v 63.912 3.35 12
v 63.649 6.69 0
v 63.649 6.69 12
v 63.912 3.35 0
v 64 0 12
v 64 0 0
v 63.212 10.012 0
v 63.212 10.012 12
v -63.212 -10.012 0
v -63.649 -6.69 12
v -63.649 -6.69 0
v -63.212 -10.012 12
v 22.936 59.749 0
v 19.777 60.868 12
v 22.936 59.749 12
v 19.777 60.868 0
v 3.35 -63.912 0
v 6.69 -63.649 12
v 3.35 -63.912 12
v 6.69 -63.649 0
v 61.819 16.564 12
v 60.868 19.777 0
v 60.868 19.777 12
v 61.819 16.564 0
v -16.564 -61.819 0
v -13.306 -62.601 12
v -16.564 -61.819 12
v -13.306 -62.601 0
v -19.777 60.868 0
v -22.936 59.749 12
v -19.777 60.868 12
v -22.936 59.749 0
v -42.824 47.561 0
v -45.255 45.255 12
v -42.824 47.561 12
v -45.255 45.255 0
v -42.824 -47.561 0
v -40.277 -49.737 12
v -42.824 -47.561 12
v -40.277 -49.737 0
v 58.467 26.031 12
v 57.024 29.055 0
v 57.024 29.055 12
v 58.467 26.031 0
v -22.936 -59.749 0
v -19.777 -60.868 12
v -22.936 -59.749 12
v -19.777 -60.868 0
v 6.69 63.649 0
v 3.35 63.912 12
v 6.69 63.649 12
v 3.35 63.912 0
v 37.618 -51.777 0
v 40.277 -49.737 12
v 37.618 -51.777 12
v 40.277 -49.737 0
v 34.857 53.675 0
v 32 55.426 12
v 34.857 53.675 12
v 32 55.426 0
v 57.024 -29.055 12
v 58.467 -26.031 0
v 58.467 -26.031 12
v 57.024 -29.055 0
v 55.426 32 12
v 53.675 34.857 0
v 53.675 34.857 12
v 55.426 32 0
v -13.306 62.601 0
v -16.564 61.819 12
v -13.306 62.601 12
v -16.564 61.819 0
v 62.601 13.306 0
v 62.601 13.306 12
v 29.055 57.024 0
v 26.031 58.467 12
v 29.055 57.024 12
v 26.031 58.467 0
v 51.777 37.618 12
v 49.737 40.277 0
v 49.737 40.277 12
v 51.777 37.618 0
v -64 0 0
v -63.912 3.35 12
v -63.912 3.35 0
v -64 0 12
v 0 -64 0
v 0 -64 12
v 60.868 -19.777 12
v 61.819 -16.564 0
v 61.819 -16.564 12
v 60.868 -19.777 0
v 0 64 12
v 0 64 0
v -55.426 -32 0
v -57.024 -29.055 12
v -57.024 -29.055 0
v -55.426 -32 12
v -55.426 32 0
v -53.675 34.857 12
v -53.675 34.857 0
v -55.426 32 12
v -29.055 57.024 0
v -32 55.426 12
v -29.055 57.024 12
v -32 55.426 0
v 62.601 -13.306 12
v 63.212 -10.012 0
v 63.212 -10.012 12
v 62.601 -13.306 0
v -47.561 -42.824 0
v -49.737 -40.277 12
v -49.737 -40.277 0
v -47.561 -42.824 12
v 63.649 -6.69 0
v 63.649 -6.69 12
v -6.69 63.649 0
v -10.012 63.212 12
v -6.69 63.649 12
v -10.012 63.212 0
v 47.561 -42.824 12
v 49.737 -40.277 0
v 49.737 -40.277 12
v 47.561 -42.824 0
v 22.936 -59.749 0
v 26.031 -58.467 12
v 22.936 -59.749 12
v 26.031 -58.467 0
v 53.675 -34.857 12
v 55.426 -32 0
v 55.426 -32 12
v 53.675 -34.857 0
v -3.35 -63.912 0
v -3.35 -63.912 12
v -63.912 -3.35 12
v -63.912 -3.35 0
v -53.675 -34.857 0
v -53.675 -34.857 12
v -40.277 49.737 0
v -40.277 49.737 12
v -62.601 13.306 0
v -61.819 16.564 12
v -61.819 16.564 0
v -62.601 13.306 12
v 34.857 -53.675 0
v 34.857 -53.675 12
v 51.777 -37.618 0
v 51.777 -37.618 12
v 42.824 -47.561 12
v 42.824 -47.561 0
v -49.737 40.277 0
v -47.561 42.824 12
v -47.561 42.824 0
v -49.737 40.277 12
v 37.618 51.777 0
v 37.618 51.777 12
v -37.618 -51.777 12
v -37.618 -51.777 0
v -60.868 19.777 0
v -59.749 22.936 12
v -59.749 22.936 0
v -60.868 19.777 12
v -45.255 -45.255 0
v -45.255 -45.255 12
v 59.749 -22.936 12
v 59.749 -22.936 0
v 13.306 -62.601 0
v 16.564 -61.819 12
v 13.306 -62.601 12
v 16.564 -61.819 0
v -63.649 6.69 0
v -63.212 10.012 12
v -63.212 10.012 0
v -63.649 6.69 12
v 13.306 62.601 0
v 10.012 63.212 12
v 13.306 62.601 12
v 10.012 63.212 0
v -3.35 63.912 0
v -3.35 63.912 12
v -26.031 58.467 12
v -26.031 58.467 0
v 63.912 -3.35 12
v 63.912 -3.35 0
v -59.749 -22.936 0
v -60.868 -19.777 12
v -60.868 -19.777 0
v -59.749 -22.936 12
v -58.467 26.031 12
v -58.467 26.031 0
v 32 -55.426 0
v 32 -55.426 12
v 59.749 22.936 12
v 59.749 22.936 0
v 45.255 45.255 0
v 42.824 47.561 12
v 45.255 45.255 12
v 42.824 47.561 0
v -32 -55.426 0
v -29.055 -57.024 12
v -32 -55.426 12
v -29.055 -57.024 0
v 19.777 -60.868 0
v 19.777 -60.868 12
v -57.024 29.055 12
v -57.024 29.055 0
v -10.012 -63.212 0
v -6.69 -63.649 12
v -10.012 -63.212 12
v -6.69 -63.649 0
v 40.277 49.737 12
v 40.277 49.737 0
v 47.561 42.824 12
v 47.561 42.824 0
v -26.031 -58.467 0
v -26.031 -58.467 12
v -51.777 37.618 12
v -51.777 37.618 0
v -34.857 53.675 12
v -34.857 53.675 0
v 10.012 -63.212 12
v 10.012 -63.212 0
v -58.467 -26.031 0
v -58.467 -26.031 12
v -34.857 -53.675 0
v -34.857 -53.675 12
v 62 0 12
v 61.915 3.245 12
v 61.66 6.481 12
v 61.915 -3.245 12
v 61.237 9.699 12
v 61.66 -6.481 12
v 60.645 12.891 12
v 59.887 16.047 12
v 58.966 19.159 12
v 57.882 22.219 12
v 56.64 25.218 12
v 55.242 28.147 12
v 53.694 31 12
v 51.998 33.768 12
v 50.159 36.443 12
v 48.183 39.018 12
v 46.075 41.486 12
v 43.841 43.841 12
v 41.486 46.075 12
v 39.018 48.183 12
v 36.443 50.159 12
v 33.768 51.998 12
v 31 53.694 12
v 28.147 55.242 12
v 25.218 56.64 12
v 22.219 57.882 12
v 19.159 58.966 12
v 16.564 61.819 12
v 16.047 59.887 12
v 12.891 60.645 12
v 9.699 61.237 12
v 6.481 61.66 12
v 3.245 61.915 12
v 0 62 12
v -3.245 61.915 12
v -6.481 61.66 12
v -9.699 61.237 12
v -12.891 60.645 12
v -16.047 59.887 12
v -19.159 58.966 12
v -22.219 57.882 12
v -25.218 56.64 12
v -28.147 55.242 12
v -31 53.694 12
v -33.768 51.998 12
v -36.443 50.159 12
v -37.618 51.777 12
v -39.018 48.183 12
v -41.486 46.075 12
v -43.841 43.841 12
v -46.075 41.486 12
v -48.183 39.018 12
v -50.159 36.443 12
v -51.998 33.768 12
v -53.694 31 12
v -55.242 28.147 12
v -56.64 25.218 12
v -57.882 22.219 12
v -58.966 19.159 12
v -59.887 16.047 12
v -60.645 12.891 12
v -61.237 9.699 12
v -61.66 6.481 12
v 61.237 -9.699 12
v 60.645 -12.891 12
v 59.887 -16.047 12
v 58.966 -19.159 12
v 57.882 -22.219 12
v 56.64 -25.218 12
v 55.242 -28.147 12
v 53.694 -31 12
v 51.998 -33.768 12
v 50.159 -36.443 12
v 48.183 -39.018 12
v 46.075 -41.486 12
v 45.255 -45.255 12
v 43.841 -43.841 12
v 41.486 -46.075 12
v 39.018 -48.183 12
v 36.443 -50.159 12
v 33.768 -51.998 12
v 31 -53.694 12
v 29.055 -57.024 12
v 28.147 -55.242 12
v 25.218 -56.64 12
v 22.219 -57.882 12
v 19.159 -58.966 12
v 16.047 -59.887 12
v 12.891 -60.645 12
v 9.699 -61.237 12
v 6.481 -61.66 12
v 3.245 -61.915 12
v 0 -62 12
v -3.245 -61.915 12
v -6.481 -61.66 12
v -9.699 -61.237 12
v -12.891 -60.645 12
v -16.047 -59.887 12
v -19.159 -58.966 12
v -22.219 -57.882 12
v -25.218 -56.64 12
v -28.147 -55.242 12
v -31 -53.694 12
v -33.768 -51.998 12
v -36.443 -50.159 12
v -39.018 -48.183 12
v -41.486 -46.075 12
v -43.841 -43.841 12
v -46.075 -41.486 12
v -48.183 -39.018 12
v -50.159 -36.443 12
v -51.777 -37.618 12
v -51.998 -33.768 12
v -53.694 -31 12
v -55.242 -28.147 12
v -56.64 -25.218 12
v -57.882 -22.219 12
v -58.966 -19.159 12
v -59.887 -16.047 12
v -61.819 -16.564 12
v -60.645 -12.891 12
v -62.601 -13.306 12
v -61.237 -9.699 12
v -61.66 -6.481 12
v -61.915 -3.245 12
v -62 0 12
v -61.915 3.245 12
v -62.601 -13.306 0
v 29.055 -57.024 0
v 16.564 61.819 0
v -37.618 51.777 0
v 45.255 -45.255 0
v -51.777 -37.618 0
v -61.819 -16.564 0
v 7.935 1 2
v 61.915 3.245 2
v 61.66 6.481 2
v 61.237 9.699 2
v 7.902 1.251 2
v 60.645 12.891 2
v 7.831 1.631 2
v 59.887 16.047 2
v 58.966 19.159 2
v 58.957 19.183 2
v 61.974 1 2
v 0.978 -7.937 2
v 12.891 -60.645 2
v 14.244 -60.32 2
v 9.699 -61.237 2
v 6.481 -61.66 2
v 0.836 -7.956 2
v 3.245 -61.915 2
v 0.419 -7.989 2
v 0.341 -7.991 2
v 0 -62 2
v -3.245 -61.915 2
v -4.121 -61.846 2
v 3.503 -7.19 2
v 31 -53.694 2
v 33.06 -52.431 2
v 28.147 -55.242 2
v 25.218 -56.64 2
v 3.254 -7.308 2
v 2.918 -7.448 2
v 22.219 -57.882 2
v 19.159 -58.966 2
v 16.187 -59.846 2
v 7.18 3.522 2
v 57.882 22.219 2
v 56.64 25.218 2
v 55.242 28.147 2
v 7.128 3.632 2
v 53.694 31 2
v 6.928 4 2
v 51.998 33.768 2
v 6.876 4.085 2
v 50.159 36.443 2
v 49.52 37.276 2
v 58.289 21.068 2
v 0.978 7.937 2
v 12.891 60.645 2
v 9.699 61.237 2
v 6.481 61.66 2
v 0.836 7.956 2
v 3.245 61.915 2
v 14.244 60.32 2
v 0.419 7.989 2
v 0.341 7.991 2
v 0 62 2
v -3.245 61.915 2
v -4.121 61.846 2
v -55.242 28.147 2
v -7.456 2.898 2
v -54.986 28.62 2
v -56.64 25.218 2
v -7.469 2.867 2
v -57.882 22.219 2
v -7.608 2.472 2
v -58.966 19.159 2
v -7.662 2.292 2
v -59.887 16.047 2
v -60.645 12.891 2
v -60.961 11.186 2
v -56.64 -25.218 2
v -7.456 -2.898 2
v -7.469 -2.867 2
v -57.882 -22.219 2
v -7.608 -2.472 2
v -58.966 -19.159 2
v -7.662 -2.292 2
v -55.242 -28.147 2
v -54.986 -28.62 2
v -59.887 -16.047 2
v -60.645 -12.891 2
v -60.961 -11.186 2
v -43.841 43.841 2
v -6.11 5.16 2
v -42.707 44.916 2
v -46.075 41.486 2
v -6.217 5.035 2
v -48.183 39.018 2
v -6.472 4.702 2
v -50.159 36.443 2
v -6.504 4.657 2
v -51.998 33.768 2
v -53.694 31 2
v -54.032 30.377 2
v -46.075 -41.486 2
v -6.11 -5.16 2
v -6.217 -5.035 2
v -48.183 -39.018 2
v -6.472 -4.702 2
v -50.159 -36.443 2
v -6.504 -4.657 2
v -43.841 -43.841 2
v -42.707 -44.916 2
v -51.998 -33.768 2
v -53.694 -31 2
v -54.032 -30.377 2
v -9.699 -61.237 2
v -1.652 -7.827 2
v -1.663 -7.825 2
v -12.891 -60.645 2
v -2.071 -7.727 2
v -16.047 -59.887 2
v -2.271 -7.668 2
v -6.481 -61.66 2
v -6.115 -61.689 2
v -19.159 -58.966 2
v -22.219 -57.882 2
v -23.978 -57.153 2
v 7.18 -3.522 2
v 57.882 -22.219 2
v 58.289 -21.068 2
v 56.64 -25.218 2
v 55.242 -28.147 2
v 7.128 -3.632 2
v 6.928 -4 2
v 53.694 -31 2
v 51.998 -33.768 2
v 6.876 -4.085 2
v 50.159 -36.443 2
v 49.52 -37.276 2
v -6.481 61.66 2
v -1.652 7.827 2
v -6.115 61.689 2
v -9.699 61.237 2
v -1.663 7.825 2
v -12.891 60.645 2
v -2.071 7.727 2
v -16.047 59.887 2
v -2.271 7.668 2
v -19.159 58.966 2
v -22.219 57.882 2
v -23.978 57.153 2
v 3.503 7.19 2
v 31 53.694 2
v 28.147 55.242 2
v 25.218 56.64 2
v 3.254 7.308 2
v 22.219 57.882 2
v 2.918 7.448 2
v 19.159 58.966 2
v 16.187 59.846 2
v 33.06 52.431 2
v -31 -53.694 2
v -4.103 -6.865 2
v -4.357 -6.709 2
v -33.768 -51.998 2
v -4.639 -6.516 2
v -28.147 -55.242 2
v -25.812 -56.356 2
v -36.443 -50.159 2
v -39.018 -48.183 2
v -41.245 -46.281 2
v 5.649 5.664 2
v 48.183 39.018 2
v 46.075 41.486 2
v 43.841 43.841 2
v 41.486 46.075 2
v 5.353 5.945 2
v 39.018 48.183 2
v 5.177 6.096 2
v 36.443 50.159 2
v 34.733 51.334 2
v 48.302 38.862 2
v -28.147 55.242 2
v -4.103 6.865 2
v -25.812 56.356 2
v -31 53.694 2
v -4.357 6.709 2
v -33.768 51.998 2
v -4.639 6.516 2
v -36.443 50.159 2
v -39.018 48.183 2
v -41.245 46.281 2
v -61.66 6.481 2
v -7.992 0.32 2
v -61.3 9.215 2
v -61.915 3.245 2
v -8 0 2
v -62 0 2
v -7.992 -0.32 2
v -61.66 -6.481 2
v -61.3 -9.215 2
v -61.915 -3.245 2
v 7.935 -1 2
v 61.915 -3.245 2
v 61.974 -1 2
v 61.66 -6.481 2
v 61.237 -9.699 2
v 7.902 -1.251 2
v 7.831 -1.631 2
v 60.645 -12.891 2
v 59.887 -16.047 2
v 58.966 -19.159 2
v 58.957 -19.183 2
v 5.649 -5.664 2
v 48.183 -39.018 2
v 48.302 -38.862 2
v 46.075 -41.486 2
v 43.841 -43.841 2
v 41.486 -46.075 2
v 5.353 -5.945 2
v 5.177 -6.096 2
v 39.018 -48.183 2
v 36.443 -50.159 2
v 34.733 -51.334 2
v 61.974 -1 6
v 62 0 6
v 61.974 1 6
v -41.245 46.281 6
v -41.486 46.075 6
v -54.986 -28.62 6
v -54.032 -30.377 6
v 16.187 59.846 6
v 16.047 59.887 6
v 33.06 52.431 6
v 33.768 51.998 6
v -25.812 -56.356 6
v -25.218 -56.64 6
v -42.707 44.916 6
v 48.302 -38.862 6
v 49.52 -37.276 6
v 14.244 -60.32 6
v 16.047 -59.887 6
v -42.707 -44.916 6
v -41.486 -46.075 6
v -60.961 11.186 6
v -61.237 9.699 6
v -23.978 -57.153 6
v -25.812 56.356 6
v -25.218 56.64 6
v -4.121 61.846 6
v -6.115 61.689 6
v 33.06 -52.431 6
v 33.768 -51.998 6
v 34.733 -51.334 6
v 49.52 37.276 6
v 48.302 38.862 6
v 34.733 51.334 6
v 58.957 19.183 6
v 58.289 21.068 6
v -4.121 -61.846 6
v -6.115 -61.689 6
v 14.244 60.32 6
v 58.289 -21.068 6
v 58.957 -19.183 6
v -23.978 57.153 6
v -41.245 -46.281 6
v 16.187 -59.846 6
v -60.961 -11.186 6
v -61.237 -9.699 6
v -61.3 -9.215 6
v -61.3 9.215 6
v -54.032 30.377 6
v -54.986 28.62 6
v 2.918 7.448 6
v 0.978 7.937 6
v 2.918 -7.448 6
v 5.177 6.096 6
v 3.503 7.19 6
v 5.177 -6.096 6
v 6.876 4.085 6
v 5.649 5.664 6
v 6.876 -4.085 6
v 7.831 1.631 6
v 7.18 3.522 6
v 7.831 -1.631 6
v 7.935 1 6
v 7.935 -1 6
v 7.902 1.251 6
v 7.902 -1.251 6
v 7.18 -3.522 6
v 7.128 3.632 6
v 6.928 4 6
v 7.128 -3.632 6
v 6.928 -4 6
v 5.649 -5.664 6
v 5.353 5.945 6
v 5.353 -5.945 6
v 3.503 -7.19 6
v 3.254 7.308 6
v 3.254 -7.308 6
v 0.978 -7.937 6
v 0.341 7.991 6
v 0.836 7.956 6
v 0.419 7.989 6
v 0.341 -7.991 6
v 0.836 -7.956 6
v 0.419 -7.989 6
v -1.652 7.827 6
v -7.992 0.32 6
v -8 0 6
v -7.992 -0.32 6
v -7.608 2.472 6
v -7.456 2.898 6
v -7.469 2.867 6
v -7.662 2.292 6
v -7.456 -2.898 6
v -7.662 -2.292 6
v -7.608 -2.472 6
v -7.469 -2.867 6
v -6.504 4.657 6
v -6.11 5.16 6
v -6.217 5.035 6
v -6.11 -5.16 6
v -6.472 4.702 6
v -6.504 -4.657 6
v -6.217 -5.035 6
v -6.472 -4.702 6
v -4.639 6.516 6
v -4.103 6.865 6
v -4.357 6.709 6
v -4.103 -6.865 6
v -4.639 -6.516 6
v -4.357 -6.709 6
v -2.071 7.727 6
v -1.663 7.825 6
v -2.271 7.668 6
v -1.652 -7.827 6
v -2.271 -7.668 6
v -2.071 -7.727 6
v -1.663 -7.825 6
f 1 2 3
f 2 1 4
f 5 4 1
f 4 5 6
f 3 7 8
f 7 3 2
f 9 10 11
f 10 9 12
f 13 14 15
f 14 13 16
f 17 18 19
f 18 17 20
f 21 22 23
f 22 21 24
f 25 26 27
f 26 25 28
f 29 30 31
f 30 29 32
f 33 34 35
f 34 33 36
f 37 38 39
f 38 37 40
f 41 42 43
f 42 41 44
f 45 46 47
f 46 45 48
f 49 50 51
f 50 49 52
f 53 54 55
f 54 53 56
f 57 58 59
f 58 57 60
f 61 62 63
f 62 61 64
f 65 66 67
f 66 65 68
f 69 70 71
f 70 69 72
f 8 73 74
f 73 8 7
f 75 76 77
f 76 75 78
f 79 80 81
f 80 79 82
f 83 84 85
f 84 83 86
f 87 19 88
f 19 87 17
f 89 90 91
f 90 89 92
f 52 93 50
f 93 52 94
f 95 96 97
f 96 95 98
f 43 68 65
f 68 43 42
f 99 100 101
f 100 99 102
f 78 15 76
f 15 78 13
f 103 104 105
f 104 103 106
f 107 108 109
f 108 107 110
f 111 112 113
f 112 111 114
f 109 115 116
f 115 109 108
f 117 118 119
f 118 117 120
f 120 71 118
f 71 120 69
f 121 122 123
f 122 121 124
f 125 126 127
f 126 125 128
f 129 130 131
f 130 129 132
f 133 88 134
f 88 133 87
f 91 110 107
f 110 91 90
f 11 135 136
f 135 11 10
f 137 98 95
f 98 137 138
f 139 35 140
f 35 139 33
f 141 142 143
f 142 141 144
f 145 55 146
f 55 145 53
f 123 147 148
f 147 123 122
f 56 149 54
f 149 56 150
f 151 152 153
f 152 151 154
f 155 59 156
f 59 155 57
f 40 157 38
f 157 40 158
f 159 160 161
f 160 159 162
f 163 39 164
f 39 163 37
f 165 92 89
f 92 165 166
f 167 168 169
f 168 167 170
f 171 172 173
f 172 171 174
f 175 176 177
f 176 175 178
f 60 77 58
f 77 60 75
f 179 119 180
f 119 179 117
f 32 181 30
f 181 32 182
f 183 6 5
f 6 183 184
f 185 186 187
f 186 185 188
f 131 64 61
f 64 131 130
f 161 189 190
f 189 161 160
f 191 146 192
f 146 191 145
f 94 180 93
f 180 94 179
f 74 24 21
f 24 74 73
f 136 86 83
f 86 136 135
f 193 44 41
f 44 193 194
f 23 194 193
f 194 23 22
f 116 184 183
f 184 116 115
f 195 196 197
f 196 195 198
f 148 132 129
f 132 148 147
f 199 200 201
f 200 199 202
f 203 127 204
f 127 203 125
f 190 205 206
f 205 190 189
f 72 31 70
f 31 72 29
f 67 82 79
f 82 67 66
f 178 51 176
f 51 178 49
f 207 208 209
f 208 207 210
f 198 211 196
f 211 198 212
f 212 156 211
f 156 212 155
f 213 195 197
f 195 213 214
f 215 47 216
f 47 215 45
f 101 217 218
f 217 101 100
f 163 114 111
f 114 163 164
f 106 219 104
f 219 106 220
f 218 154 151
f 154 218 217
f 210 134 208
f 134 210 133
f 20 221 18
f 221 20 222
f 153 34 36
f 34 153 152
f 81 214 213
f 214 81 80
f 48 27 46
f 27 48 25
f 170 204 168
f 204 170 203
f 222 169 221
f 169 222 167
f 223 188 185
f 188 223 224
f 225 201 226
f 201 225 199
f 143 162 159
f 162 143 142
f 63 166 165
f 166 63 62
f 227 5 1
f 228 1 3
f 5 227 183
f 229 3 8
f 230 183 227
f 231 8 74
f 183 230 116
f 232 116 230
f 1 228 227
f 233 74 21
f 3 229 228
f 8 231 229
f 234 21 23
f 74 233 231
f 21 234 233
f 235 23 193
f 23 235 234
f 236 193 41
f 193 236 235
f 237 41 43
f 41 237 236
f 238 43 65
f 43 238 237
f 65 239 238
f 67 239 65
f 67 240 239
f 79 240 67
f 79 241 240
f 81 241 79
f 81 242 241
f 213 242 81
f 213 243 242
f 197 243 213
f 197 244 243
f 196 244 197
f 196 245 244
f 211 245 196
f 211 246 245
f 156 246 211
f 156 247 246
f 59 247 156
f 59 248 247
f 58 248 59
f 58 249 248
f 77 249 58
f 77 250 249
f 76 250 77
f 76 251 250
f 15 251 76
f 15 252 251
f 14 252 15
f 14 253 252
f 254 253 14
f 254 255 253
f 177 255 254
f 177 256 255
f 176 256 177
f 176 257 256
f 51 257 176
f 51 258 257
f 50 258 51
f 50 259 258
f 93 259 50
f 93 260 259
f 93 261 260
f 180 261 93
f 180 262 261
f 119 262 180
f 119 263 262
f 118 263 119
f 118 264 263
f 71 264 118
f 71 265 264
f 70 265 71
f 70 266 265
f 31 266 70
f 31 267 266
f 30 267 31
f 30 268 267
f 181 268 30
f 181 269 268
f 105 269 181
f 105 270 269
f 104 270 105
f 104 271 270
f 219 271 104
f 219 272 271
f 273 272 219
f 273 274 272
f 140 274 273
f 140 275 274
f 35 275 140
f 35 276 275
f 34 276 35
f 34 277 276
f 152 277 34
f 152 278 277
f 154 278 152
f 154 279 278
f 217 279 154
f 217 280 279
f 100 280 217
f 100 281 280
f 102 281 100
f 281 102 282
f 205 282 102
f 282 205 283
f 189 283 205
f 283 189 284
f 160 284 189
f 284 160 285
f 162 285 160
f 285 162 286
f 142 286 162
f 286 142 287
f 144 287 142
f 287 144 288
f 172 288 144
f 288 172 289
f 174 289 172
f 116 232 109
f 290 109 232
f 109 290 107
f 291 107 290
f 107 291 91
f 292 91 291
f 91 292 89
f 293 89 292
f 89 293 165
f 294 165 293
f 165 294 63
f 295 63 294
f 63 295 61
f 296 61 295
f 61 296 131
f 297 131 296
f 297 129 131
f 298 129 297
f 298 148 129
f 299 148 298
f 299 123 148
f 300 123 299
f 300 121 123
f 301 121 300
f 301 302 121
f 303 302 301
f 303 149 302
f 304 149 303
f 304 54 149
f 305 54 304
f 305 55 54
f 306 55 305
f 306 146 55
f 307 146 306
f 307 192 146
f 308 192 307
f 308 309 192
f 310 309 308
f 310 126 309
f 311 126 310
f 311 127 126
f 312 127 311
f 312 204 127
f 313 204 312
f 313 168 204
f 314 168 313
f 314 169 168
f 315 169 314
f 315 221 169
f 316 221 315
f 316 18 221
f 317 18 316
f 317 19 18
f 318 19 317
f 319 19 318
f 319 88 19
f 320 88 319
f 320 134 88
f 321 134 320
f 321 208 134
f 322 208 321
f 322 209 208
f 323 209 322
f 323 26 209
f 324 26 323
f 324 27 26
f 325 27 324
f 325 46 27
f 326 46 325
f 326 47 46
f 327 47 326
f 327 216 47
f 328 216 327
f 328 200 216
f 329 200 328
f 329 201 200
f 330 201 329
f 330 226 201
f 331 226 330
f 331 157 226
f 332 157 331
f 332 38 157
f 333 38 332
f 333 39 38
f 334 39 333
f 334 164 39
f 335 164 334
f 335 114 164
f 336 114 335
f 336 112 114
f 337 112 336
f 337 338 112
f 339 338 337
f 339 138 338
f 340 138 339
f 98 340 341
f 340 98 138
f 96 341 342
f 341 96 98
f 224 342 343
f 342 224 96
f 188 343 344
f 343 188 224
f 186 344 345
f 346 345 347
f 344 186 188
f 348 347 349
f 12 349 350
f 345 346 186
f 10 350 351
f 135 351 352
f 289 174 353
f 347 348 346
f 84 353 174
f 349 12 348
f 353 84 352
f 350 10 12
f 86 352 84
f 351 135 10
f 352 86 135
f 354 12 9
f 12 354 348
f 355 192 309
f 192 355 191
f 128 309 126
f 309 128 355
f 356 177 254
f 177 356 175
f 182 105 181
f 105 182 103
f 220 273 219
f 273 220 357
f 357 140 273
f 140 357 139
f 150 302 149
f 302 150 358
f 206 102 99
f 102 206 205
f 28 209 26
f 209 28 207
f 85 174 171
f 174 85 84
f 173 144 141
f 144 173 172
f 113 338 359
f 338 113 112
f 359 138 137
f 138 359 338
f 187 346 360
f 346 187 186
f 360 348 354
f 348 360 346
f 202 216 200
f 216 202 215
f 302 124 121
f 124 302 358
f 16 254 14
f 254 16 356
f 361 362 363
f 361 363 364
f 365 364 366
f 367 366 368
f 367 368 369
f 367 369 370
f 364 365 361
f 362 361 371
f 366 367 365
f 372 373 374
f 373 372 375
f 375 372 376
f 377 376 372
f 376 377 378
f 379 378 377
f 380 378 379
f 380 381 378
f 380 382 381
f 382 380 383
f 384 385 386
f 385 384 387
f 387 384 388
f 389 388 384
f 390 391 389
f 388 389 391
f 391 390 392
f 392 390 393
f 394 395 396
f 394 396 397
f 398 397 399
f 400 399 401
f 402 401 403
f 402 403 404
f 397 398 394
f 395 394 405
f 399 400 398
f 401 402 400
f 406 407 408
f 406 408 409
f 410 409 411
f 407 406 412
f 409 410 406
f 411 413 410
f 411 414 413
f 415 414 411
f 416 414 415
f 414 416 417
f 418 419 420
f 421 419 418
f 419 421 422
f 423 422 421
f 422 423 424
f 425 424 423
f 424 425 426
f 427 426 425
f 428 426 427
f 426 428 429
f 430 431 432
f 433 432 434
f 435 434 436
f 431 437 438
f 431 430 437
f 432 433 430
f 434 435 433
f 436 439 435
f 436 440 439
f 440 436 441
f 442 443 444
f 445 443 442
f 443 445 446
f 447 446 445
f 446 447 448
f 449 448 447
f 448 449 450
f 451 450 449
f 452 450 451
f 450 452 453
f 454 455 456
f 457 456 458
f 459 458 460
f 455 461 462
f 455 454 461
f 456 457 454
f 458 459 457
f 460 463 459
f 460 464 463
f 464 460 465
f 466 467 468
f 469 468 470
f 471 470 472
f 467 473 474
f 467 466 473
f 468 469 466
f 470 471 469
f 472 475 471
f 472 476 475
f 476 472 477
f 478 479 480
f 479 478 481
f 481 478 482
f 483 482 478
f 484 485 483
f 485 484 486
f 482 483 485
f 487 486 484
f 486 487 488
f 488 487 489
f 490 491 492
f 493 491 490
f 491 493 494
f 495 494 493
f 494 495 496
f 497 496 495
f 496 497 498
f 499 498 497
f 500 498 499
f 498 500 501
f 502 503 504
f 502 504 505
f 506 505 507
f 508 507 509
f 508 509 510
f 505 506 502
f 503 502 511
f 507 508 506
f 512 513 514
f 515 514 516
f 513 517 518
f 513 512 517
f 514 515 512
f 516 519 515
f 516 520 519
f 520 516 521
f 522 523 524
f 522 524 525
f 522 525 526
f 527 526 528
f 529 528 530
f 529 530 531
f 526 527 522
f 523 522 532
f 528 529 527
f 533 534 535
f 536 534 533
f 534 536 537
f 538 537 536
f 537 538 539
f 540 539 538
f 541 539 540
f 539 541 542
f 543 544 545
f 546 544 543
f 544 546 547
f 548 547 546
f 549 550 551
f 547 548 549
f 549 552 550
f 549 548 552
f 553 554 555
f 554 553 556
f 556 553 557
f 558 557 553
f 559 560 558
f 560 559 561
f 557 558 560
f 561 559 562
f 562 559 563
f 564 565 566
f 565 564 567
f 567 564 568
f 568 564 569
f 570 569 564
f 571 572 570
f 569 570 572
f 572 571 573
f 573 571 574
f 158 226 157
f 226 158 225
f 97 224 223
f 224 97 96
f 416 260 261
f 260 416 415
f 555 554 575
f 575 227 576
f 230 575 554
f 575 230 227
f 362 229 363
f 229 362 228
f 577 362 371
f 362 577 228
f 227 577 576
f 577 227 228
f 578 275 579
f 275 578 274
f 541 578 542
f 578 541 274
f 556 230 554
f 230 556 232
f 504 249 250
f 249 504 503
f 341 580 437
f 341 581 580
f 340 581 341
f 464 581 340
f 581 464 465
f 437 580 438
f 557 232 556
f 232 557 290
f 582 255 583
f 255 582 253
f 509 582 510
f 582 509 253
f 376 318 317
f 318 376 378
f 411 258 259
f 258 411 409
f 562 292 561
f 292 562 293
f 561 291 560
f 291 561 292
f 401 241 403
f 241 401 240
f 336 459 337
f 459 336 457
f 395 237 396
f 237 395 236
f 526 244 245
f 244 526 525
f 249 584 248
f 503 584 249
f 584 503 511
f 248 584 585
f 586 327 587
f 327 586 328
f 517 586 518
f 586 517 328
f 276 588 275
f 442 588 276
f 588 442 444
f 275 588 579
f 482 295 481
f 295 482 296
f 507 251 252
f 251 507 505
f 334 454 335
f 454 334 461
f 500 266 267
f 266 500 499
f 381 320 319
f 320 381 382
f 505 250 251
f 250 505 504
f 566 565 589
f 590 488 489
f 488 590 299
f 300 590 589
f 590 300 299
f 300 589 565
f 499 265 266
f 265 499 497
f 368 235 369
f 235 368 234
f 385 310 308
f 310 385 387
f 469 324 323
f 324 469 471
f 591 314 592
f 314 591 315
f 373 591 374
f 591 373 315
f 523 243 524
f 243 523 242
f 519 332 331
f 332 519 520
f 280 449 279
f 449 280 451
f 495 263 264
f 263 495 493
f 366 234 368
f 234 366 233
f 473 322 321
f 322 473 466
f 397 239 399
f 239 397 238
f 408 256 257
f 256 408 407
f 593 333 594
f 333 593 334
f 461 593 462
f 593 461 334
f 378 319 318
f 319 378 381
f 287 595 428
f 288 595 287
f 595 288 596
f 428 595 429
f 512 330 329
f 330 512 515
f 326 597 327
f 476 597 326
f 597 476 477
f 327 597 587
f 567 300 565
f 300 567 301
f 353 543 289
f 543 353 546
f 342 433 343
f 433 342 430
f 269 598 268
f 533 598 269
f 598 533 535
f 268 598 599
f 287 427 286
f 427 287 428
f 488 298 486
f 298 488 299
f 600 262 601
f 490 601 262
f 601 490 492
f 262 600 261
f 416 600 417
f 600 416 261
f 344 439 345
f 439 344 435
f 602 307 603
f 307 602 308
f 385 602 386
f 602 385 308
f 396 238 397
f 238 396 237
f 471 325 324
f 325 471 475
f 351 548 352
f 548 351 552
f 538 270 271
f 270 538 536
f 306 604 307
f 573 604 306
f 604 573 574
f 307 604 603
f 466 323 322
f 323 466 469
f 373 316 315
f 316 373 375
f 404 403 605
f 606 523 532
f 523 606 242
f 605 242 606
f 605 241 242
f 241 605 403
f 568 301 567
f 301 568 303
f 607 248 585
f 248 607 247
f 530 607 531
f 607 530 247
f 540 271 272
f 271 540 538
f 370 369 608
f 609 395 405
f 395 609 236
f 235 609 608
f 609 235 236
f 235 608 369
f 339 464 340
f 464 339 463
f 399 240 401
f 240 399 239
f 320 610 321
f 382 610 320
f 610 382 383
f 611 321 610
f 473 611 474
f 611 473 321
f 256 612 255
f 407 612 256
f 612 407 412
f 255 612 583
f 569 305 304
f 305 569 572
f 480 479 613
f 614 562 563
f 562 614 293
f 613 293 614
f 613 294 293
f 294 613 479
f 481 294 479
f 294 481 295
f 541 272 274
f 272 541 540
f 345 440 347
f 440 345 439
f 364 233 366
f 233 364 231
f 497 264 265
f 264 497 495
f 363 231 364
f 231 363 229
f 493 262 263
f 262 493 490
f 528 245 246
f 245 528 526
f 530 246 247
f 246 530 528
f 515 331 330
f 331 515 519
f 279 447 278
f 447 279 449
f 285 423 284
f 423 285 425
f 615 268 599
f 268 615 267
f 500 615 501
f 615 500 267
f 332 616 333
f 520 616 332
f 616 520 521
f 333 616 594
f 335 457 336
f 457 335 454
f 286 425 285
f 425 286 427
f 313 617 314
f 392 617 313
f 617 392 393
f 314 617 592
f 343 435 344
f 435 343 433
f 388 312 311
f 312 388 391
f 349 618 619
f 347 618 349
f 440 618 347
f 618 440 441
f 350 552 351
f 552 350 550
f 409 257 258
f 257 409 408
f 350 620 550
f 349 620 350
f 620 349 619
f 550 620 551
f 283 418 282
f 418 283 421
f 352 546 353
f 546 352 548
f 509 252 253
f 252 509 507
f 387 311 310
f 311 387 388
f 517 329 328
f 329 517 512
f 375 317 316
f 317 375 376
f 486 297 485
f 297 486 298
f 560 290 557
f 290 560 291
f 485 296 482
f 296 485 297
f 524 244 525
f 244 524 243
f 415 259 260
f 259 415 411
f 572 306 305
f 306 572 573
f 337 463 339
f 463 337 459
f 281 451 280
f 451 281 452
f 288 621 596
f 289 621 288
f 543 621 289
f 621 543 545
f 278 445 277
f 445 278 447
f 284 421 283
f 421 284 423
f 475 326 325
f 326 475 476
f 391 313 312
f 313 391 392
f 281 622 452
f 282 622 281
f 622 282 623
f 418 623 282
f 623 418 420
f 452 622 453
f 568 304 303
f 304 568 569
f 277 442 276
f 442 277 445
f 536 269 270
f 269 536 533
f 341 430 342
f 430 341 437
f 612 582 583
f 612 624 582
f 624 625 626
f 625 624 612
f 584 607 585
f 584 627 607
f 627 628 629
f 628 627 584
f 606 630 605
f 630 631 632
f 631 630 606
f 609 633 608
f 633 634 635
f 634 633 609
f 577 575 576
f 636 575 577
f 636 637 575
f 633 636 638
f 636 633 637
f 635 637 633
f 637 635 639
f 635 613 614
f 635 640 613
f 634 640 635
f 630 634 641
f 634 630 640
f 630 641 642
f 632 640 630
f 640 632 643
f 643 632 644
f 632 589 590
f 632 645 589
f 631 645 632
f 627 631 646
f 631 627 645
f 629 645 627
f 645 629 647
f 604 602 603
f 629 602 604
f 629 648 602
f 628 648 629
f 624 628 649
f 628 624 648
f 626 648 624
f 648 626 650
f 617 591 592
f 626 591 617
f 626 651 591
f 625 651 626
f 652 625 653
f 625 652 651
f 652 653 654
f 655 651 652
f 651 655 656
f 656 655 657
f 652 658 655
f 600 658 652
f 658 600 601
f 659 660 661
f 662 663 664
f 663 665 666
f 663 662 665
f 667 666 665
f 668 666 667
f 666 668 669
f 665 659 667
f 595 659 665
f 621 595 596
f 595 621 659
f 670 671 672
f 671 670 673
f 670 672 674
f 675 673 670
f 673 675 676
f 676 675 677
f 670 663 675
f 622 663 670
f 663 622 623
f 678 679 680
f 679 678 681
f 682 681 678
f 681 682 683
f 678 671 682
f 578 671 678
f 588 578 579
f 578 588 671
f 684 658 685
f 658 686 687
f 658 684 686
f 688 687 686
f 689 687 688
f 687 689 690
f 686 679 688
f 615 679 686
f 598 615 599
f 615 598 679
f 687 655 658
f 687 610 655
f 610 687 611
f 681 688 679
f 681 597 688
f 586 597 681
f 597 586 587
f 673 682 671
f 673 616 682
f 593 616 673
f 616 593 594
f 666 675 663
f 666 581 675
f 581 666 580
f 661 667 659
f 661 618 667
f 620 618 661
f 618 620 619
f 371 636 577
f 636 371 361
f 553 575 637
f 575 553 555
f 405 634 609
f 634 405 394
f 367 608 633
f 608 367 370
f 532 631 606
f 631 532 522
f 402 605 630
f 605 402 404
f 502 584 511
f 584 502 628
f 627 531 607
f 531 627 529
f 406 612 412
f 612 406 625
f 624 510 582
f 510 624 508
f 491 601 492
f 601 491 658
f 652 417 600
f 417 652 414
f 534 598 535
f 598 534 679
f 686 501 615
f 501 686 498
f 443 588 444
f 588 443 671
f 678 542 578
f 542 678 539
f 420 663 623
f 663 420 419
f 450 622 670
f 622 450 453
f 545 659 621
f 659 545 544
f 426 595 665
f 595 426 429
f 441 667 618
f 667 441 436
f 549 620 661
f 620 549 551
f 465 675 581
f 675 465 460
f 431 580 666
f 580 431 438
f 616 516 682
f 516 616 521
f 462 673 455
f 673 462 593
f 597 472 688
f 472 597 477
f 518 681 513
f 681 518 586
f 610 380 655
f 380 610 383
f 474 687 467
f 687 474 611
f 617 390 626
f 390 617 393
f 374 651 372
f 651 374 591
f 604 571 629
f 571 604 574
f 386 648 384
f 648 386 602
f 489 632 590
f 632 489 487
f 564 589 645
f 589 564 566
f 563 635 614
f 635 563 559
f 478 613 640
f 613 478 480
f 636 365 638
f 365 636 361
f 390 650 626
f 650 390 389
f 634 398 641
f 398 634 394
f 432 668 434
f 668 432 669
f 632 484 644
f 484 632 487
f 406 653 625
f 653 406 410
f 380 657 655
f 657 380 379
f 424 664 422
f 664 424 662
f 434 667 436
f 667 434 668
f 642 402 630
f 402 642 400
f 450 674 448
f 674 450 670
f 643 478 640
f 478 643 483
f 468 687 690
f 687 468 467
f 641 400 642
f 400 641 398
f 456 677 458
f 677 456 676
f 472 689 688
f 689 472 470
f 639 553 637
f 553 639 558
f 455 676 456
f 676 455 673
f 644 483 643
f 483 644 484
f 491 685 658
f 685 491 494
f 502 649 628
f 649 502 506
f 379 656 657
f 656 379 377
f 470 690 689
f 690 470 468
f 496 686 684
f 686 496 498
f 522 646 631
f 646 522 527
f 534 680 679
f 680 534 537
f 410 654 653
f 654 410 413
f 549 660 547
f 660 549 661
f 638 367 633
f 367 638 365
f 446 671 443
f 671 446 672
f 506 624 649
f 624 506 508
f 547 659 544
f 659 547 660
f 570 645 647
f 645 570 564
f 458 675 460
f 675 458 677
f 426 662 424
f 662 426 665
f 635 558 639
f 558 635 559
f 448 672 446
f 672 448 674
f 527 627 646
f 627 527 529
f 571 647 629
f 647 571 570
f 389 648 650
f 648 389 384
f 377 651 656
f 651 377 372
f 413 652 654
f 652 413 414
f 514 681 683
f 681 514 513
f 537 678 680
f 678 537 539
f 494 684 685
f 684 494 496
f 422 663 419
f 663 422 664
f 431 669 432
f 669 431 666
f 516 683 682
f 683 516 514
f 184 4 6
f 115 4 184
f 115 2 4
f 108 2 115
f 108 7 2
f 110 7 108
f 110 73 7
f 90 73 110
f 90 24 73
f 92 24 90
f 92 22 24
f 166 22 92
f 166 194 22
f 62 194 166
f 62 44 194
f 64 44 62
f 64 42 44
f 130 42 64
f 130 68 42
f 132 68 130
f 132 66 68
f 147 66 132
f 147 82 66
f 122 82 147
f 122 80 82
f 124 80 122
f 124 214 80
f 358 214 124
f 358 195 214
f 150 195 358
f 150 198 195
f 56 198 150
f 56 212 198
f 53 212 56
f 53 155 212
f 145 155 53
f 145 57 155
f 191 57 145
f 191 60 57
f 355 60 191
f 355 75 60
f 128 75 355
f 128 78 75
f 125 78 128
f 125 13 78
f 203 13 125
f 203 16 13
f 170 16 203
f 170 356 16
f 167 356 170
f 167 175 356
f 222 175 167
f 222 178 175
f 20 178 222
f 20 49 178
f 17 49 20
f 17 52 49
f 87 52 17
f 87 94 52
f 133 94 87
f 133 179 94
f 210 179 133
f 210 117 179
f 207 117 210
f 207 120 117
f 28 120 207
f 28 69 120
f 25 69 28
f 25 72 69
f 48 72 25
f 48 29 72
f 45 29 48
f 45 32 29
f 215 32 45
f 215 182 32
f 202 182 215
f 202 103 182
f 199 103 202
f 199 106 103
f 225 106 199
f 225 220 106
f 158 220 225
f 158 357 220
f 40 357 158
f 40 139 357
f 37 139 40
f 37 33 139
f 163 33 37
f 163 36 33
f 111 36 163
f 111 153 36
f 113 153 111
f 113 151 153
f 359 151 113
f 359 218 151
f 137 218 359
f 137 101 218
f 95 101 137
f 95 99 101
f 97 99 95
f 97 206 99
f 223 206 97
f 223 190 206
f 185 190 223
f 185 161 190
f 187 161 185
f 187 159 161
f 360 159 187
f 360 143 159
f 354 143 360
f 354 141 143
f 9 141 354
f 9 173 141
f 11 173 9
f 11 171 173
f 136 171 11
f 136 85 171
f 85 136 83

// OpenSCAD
// --- DRAINAGE SAUCER GENERATOR ---
// Features:
// 1. Watertight Bottom (Additive construction).
// 2. Dynamic Ribs & Hub (Scales automatically based on diameter).
// 3. Configurable dimensions.

// --- CURVE QUALITY ($fn) ---
// This number controls how smooth circles look. 
// OpenSCAD creates circles using many small straight lines.
//   60  = Good for small prints or drafts (faster to render).
//   120 = Smooth quality (recommended for final prints).// --- DRAINAGE SAUCER GENERATOR ---
// Features:
// 1. Watertight Bottom (Additive construction).
// 2. Dynamic Ribs & Hub.
// 3. Flared Walls (Fixed for high angles).

// --- CURVE QUALITY ($fn) ---
// This number controls how smooth circles look. 
//   60  = Good for small prints or drafts (faster to render).
//   120 = Smooth quality (recommended for final prints).
$fn = 120; 

// --- CONFIGURATION ---

// Diameter of the pot bottom intended for this saucer
pot_diameter = 178; 

// Height of the outer side walls
wall_height = 8; 

// Angle to flare the walls outward (0 = vertical, 15 = standard flare)
flare_angle = 50;

// Lift Height (Airflow/Drainage gap)
rib_height = 3;    

// --- MATERIAL THICKNESS ---
floor_thick = 2.0; // Thickness of the solid bottom base
wall_thick = 2.0;  // Thickness of the vertical side walls
rib_thick = 2.0;   // Thickness of the internal ribs

// --- RIB SETTINGS ---
// Set to 0 = Automatic calculation
// Set to >0 = Manual Count
rib_count = 10;

// --- RENDER ---
saucer_assembly();

module saucer_assembly() {
    
    // --- DIMENSION LOGIC ---
    // Add clearance for easy fit (2mm total gap)
    inner_rad = (pot_diameter / 2) + 2;
    outer_rad = inner_rad + wall_thick;
    
    // Calculate geometric rise/run
    flare_tan = tan(flare_angle);
    flare_offset = wall_height * flare_tan;
    
    // Dynamic internals
    hub_radius = max(4, pot_diameter / 15);
    auto_rib_count = max(6, floor((2 * 3.14159 * inner_rad) / 20));
    step_angle = 360 / ((rib_count > 0) ? rib_count : auto_rib_count);
    final_ribs = (rib_count > 0) ? rib_count : auto_rib_count;

    // Output calculated parameters to console
    echo(str("Saucer Diameter: ", pot_diameter, "mm"));
    echo(str("Rib Count: ", final_ribs));
    echo(str("Flare Offset: ", flare_offset, "mm"));

    union() {
        
        // 1. SOLID FLOOR DISC
        color("DodgerBlue")
        cylinder(r=outer_rad, h=floor_thick);
        
        // 2. FLARED WALL RING
        color("SteelBlue")
        translate([0, 0, floor_thick])
        difference() {
            // Main Body
            cylinder(r1=outer_rad, r2=outer_rad + flare_offset, h=wall_height); 
            
            // --- BOOLEAN MATH FIX ---
            // We extend the cutout down (-1mm) and up (+1mm) to ensure a clean cut.
            // But we must adjust the radius so the wall thickness stays constant at Z=0.
            // r_bottom = target_radius - (slope * height_shift)
            
            cut_depth_bottom = 1;
            cut_depth_top = 1;
            
            r_cut_bottom = inner_rad - (flare_tan * cut_depth_bottom);
            r_cut_top = (inner_rad + flare_offset) + (flare_tan * cut_depth_top);
            
            translate([0,0,-cut_depth_bottom])
                cylinder(r1=r_cut_bottom, r2=r_cut_top, h=wall_height + cut_depth_bottom + cut_depth_top); 
        }
        
        // 3. RIBS & HUB STRUCTURE
        color("LightSkyBlue")
        translate([0, 0, floor_thick])
        union() {
            for(i=[0:final_ribs-1]) {
                rotate([0, 0, i*step_angle])
                translate([inner_rad/2, 0, rib_height/2])
                    cube([inner_rad, rib_thick, rib_height], center=true);
            }
            cylinder(r=hub_radius, h=rib_height);
        }
    }
}
//   360 = Very high definition (slow to render).
$fn = 120; 

// --- CONFIGURATION ---

// Diameter of the pot bottom intended for this saucer
pot_diameter = 120; 

// Height of the outer side walls
wall_height = 10; 

// Lift Height (Airflow/Drainage gap)
rib_height = 4;    

// --- MATERIAL THICKNESS ---
floor_thick = 2.0; // Thickness of the solid bottom base
wall_thick = 2.0;  // Thickness of the vertical side walls
rib_thick = 2.0;   // Thickness of the internal ribs

// --- RIB SETTINGS ---
// Set to 0 = Automatic calculation
// Set to >0 = Manual Count
rib_count = 0;

// --- RENDER ---
saucer_assembly();

module saucer_assembly() {
    
    // --- DIMENSION LOGIC ---
    // Add clearance for easy fit (2mm total gap)
    inner_rad = (pot_diameter / 2) + 2;
    outer_rad = inner_rad + wall_thick;
    
    // Dynamic Hub: ~1/15th of diameter, constrained to min 4mm
    hub_radius = max(4, pot_diameter / 15);
    
    // Dynamic Ribs: 1 rib approximately every 20mm of circumference
    auto_rib_count = max(6, floor((2 * 3.14159 * inner_rad) / 20));
    step_angle = 360 / ((rib_count > 0) ? rib_count : auto_rib_count);
    
    final_ribs = (rib_count > 0) ? rib_count : auto_rib_count;

    // Output calculated parameters to console
    echo(str("Saucer Diameter: ", pot_diameter, "mm"));
    echo(str("Rib Count: ", final_ribs));
    echo(str("Hub Radius: ", hub_radius, "mm"));

    union() {
        
        // 1. SOLID FLOOR DISC
        color("DodgerBlue")
        cylinder(r=outer_rad, h=floor_thick);
        
        // 2. WALL RING
        color("SteelBlue")
        translate([0, 0, floor_thick])
        difference() {
            cylinder(r=outer_rad, h=wall_height); 
            translate([0,0,-1])
                cylinder(r=inner_rad, h=wall_height + 2); 
        }
        
        // 3. RIBS & HUB STRUCTURE
        color("LightSkyBlue")
        translate([0, 0, floor_thick])
        union() {
            // Generate Radial Ribs
            for(i=[0:final_ribs-1]) {
                rotate([0, 0, i*step_angle])
                translate([inner_rad/2, 0, rib_height/2])
                    cube([inner_rad, rib_thick, rib_height], center=true);
            }
            
            // Central Hub
            cylinder(r=hub_radius, h=rib_height);
        }
    }
}
